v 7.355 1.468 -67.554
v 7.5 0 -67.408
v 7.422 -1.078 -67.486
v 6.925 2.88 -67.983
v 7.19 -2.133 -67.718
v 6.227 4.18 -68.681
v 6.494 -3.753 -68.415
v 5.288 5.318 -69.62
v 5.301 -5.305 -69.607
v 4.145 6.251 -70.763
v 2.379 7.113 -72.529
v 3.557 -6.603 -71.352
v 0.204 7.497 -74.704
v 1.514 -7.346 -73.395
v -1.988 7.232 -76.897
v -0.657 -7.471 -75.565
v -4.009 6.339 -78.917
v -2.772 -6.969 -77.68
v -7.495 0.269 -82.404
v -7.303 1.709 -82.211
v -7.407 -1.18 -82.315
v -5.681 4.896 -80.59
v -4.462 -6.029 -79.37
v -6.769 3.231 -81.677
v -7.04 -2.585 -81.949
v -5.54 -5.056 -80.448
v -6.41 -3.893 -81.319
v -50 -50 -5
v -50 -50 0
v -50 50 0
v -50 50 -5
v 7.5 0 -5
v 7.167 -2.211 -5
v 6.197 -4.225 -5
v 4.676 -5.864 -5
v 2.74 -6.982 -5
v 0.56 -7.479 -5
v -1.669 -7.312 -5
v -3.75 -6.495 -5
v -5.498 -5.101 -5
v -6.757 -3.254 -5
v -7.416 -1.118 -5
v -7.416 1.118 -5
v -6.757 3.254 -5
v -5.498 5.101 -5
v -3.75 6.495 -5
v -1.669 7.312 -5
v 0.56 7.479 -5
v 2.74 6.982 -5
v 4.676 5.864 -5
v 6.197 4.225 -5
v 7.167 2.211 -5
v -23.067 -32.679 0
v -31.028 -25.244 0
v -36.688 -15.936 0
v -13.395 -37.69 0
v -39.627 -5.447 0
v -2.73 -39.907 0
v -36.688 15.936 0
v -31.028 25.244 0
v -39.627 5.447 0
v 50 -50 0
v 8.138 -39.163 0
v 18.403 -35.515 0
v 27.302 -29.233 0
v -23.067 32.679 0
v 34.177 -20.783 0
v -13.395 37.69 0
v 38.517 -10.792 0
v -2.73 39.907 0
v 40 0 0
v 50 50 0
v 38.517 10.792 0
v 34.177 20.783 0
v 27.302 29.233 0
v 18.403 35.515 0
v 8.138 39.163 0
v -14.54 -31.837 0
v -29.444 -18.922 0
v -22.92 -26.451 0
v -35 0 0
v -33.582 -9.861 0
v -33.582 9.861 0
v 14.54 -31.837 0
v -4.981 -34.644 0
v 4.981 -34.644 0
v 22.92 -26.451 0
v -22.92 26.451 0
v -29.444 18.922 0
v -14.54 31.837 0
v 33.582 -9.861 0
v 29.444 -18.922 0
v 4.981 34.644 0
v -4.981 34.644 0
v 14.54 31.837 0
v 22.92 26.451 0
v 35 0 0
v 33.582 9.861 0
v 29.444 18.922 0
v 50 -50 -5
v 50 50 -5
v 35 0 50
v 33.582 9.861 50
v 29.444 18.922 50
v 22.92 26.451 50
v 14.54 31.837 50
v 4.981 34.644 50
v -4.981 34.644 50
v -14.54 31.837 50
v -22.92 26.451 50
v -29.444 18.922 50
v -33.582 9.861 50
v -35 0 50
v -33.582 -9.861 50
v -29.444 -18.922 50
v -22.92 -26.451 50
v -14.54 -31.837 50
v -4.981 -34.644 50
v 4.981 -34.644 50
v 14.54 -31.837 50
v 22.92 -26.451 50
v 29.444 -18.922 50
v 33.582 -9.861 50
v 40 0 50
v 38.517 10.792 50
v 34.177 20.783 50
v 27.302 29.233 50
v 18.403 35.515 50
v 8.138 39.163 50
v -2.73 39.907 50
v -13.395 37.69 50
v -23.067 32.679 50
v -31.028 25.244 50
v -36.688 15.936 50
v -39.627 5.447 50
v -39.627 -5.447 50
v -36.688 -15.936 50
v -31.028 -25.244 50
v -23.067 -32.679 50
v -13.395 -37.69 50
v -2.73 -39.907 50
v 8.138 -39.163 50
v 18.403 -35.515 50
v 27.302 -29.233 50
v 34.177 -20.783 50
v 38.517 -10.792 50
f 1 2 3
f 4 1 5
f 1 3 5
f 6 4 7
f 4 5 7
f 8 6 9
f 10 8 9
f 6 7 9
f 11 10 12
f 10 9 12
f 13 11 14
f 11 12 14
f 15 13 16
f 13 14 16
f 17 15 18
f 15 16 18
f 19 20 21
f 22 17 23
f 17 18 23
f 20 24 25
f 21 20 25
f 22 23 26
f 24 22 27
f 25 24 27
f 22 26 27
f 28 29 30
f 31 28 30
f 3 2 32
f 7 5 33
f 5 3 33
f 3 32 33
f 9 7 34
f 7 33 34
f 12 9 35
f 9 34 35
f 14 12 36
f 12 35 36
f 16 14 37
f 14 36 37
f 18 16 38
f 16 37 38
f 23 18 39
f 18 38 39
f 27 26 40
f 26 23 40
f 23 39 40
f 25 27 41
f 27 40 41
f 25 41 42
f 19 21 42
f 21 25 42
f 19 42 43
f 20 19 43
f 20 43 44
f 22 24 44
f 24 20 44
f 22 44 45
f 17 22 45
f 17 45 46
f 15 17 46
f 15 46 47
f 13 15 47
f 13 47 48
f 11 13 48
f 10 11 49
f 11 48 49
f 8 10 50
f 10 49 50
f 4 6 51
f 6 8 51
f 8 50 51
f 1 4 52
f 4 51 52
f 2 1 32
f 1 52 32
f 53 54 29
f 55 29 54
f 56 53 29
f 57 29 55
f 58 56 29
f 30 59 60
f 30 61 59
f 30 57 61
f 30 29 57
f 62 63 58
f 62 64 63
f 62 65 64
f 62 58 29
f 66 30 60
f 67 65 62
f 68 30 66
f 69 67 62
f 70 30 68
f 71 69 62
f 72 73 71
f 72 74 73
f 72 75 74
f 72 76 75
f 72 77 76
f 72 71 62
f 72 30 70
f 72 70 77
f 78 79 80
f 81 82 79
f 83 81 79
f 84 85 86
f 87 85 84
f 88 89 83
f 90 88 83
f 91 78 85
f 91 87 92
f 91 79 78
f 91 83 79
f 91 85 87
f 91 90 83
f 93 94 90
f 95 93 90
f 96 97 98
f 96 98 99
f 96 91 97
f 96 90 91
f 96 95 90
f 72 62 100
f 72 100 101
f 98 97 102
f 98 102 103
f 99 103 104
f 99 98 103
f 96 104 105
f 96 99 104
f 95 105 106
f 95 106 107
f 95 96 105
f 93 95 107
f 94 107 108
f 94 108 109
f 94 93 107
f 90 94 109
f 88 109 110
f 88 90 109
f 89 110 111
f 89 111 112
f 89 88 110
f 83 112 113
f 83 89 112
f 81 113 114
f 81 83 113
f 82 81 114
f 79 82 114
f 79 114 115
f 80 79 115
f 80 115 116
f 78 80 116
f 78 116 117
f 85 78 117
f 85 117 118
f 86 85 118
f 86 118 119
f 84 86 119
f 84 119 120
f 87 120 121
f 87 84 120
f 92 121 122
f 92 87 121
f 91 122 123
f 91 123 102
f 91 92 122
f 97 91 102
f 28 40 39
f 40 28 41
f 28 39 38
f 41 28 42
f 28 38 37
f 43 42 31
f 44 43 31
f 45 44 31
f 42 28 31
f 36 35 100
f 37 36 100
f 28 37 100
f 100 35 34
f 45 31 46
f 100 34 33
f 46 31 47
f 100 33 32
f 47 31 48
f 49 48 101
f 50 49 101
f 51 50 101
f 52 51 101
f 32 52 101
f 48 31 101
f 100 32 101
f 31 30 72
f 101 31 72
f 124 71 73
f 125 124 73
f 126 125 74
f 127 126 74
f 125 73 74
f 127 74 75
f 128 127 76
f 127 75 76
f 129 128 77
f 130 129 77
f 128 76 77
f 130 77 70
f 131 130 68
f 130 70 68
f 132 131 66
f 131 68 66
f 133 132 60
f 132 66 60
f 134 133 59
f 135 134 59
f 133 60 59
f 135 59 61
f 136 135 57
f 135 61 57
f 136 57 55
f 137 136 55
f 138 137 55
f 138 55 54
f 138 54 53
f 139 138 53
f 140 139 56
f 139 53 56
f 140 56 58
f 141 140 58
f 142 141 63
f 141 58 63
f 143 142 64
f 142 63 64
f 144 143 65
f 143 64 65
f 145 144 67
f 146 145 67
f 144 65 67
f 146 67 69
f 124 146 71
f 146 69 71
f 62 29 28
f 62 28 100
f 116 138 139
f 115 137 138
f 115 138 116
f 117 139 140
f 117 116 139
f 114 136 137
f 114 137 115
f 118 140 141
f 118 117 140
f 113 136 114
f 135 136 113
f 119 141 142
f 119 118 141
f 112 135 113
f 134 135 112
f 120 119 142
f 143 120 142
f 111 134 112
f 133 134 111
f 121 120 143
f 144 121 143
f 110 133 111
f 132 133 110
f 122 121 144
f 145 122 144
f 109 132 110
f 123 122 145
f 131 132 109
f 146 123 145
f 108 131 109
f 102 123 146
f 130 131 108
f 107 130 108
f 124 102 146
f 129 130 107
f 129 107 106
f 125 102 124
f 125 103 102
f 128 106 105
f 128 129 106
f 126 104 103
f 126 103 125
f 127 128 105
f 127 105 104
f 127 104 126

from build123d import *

# Parameters (mm, degrees)
F0_W     = 100
F0_H     = 100
F0_R     = 40
F0_R_2   = 35
F1_DEPTH = 5
F2_DEPTH = 50
F3_R     = 7.5
F4_DEPTH = 80
F6_DEPTH = 25


with BuildPart() as f1:
    # F0 (on Top) → F1 (new body)
    with BuildSketch(Plane.XY):
        Rectangle(F0_W, F0_H)
        Circle(F0_R, mode=Mode.SUBTRACT)
        Circle(F0_R)
        Circle(F0_R_2, mode=Mode.SUBTRACT)
        Circle(F0_R_2)
    extrude(amount=-F1_DEPTH)

    # F0 (on Top) → F2 (join)
    with BuildSketch(Plane.XY):
        Circle(F0_R)
        Circle(F0_R_2, mode=Mode.SUBTRACT)
    extrude(amount=F2_DEPTH)

    # F3 (on face) → F4 (join)
    with BuildSketch(Plane(origin=(0, 0, -5), x_dir=(1, 0, 0), z_dir=(0, 0, -1))):
        Circle(F3_R)
    extrude(amount=F4_DEPTH)


with BuildPart() as f6:
    # F5 (on Front) → F6 (new body, symmetric)
    with BuildSketch(Plane.XZ):
        Polygon((13.101274, -90.236664), (13.101274, -61.807115), (-15.328275, -90.236664), align=None)
    extrude(amount=F6_DEPTH, both=True)


with BuildPart() as f1_1:
    add(f1.part)

    # F7: cut F6
    add(f6.part, mode=Mode.SUBTRACT)


solid = f1_1.part
